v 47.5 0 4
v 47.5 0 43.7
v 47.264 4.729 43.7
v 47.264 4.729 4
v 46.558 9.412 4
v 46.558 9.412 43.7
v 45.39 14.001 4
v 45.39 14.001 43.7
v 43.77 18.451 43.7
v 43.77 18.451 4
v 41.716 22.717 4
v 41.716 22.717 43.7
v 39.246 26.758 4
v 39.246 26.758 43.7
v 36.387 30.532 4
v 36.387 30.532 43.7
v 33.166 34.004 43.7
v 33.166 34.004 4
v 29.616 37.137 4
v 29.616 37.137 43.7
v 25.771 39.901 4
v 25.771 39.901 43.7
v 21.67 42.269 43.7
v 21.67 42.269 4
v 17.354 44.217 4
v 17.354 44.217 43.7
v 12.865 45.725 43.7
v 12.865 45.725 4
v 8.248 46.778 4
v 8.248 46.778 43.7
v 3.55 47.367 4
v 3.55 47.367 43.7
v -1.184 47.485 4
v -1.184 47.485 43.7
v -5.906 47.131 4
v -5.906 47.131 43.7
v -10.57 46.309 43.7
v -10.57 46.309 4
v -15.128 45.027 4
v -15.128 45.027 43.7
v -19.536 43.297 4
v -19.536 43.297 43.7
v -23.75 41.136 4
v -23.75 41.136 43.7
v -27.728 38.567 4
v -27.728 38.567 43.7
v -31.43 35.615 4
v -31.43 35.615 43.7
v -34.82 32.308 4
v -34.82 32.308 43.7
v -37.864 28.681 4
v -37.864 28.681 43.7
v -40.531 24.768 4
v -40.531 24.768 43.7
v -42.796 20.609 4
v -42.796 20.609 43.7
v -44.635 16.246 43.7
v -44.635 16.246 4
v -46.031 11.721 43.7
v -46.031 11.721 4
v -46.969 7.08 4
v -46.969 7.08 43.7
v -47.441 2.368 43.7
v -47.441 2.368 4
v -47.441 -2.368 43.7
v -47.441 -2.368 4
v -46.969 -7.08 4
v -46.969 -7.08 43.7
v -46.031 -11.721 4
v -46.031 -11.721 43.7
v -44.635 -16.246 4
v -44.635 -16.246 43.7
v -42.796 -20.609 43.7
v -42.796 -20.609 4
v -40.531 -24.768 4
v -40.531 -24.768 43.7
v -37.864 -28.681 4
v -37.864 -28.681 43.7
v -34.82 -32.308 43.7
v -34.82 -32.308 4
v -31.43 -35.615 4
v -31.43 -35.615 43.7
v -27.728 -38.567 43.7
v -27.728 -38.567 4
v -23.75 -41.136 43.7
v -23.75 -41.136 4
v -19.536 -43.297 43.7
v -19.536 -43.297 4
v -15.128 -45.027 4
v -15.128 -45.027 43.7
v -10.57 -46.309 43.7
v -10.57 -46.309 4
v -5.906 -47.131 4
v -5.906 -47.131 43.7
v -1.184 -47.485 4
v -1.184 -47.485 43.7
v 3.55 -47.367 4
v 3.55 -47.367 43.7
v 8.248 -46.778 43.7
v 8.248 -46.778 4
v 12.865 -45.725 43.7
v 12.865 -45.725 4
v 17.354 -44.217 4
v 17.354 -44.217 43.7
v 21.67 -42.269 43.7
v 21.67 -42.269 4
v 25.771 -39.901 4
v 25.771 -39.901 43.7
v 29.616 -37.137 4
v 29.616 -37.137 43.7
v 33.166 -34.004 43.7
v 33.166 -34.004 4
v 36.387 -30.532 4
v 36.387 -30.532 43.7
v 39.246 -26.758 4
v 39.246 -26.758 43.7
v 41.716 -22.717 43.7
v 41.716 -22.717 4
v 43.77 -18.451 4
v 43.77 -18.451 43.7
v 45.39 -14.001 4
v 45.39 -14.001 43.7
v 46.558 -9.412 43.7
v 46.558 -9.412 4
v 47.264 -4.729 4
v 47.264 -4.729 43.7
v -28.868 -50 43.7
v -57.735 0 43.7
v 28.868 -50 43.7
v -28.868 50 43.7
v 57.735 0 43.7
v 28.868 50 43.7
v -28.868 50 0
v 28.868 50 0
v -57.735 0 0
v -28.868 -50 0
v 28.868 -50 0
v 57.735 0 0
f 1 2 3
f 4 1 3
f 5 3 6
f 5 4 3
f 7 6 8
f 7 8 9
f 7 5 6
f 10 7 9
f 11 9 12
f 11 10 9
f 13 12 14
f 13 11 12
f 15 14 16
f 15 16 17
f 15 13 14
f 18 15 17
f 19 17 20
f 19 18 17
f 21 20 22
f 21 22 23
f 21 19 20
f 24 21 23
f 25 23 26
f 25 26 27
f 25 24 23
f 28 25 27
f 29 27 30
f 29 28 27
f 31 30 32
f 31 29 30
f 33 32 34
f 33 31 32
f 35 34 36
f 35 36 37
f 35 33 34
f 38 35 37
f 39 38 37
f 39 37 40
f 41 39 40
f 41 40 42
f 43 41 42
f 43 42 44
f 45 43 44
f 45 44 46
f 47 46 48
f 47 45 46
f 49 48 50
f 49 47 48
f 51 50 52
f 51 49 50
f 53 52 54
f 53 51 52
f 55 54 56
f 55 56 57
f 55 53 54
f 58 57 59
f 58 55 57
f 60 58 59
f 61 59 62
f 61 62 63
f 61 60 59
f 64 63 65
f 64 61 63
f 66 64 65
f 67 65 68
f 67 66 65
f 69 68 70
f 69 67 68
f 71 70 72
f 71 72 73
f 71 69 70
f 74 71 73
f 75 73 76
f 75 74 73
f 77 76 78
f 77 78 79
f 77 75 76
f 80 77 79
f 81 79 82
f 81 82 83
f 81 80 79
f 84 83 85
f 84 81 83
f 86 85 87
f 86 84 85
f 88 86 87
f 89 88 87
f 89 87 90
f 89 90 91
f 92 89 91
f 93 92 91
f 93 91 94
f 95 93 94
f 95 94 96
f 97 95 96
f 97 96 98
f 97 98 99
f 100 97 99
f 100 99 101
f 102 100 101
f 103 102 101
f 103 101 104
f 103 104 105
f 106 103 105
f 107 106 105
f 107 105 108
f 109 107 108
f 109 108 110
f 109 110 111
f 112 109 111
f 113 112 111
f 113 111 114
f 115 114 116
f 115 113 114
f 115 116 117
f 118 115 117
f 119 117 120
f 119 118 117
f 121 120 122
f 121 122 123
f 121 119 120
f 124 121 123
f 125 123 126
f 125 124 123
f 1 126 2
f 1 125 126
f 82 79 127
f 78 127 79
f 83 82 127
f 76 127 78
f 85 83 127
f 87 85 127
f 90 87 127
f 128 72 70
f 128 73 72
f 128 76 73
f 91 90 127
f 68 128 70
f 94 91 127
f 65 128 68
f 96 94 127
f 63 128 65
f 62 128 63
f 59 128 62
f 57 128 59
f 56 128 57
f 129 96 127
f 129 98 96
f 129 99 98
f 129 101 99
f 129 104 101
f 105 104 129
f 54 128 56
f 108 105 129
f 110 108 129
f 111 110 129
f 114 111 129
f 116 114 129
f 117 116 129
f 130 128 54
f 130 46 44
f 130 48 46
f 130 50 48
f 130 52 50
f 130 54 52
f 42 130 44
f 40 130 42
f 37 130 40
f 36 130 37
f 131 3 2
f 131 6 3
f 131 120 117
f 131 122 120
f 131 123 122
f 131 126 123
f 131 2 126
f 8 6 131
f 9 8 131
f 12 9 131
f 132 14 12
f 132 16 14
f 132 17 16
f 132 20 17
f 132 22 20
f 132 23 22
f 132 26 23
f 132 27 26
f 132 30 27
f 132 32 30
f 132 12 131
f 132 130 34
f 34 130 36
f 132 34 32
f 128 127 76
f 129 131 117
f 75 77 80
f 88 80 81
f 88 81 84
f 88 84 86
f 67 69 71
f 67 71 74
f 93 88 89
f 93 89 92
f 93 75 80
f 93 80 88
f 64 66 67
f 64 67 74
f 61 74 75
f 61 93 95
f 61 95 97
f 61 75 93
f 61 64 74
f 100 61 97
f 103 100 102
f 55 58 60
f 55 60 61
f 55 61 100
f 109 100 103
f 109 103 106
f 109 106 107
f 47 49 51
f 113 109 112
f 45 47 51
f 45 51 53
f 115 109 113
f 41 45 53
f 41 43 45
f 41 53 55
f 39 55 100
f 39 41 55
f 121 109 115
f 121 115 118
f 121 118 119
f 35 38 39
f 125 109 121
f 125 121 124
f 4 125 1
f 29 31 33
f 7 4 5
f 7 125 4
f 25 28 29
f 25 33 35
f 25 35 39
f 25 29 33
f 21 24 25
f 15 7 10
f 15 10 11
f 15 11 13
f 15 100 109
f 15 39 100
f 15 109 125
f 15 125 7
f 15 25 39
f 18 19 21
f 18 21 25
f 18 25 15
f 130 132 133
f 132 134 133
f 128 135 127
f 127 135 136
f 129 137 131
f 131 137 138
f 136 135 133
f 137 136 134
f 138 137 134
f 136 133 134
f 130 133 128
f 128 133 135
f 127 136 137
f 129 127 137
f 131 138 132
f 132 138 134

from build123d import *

# Parameters (mm, degrees)
F1_DEPTH = 4
F3_R     = 47.5
F4_DEPTH = 39.7


with BuildPart() as f1:
    # F0 (on Top) → F1 (new body)
    with BuildSketch(Plane.XY):
        Polygon((28.867513, 50), (-28.867513, 50), (-57.735027, 0), (-28.867513, -50), (28.867513, -50), (57.735027, 0), align=None)
    extrude(amount=F1_DEPTH)

    # F3 (on face) → F4 (join)
    with BuildSketch(Plane.XY.offset(4)):
        Polygon((57.735027, 0), (28.867513, 50), (-28.867513, 50), (-57.735027, 0), (-28.867513, -50), (28.867513, -50), align=None)
        Circle(F3_R, mode=Mode.SUBTRACT)
    extrude(amount=F4_DEPTH)


solid = f1.part
